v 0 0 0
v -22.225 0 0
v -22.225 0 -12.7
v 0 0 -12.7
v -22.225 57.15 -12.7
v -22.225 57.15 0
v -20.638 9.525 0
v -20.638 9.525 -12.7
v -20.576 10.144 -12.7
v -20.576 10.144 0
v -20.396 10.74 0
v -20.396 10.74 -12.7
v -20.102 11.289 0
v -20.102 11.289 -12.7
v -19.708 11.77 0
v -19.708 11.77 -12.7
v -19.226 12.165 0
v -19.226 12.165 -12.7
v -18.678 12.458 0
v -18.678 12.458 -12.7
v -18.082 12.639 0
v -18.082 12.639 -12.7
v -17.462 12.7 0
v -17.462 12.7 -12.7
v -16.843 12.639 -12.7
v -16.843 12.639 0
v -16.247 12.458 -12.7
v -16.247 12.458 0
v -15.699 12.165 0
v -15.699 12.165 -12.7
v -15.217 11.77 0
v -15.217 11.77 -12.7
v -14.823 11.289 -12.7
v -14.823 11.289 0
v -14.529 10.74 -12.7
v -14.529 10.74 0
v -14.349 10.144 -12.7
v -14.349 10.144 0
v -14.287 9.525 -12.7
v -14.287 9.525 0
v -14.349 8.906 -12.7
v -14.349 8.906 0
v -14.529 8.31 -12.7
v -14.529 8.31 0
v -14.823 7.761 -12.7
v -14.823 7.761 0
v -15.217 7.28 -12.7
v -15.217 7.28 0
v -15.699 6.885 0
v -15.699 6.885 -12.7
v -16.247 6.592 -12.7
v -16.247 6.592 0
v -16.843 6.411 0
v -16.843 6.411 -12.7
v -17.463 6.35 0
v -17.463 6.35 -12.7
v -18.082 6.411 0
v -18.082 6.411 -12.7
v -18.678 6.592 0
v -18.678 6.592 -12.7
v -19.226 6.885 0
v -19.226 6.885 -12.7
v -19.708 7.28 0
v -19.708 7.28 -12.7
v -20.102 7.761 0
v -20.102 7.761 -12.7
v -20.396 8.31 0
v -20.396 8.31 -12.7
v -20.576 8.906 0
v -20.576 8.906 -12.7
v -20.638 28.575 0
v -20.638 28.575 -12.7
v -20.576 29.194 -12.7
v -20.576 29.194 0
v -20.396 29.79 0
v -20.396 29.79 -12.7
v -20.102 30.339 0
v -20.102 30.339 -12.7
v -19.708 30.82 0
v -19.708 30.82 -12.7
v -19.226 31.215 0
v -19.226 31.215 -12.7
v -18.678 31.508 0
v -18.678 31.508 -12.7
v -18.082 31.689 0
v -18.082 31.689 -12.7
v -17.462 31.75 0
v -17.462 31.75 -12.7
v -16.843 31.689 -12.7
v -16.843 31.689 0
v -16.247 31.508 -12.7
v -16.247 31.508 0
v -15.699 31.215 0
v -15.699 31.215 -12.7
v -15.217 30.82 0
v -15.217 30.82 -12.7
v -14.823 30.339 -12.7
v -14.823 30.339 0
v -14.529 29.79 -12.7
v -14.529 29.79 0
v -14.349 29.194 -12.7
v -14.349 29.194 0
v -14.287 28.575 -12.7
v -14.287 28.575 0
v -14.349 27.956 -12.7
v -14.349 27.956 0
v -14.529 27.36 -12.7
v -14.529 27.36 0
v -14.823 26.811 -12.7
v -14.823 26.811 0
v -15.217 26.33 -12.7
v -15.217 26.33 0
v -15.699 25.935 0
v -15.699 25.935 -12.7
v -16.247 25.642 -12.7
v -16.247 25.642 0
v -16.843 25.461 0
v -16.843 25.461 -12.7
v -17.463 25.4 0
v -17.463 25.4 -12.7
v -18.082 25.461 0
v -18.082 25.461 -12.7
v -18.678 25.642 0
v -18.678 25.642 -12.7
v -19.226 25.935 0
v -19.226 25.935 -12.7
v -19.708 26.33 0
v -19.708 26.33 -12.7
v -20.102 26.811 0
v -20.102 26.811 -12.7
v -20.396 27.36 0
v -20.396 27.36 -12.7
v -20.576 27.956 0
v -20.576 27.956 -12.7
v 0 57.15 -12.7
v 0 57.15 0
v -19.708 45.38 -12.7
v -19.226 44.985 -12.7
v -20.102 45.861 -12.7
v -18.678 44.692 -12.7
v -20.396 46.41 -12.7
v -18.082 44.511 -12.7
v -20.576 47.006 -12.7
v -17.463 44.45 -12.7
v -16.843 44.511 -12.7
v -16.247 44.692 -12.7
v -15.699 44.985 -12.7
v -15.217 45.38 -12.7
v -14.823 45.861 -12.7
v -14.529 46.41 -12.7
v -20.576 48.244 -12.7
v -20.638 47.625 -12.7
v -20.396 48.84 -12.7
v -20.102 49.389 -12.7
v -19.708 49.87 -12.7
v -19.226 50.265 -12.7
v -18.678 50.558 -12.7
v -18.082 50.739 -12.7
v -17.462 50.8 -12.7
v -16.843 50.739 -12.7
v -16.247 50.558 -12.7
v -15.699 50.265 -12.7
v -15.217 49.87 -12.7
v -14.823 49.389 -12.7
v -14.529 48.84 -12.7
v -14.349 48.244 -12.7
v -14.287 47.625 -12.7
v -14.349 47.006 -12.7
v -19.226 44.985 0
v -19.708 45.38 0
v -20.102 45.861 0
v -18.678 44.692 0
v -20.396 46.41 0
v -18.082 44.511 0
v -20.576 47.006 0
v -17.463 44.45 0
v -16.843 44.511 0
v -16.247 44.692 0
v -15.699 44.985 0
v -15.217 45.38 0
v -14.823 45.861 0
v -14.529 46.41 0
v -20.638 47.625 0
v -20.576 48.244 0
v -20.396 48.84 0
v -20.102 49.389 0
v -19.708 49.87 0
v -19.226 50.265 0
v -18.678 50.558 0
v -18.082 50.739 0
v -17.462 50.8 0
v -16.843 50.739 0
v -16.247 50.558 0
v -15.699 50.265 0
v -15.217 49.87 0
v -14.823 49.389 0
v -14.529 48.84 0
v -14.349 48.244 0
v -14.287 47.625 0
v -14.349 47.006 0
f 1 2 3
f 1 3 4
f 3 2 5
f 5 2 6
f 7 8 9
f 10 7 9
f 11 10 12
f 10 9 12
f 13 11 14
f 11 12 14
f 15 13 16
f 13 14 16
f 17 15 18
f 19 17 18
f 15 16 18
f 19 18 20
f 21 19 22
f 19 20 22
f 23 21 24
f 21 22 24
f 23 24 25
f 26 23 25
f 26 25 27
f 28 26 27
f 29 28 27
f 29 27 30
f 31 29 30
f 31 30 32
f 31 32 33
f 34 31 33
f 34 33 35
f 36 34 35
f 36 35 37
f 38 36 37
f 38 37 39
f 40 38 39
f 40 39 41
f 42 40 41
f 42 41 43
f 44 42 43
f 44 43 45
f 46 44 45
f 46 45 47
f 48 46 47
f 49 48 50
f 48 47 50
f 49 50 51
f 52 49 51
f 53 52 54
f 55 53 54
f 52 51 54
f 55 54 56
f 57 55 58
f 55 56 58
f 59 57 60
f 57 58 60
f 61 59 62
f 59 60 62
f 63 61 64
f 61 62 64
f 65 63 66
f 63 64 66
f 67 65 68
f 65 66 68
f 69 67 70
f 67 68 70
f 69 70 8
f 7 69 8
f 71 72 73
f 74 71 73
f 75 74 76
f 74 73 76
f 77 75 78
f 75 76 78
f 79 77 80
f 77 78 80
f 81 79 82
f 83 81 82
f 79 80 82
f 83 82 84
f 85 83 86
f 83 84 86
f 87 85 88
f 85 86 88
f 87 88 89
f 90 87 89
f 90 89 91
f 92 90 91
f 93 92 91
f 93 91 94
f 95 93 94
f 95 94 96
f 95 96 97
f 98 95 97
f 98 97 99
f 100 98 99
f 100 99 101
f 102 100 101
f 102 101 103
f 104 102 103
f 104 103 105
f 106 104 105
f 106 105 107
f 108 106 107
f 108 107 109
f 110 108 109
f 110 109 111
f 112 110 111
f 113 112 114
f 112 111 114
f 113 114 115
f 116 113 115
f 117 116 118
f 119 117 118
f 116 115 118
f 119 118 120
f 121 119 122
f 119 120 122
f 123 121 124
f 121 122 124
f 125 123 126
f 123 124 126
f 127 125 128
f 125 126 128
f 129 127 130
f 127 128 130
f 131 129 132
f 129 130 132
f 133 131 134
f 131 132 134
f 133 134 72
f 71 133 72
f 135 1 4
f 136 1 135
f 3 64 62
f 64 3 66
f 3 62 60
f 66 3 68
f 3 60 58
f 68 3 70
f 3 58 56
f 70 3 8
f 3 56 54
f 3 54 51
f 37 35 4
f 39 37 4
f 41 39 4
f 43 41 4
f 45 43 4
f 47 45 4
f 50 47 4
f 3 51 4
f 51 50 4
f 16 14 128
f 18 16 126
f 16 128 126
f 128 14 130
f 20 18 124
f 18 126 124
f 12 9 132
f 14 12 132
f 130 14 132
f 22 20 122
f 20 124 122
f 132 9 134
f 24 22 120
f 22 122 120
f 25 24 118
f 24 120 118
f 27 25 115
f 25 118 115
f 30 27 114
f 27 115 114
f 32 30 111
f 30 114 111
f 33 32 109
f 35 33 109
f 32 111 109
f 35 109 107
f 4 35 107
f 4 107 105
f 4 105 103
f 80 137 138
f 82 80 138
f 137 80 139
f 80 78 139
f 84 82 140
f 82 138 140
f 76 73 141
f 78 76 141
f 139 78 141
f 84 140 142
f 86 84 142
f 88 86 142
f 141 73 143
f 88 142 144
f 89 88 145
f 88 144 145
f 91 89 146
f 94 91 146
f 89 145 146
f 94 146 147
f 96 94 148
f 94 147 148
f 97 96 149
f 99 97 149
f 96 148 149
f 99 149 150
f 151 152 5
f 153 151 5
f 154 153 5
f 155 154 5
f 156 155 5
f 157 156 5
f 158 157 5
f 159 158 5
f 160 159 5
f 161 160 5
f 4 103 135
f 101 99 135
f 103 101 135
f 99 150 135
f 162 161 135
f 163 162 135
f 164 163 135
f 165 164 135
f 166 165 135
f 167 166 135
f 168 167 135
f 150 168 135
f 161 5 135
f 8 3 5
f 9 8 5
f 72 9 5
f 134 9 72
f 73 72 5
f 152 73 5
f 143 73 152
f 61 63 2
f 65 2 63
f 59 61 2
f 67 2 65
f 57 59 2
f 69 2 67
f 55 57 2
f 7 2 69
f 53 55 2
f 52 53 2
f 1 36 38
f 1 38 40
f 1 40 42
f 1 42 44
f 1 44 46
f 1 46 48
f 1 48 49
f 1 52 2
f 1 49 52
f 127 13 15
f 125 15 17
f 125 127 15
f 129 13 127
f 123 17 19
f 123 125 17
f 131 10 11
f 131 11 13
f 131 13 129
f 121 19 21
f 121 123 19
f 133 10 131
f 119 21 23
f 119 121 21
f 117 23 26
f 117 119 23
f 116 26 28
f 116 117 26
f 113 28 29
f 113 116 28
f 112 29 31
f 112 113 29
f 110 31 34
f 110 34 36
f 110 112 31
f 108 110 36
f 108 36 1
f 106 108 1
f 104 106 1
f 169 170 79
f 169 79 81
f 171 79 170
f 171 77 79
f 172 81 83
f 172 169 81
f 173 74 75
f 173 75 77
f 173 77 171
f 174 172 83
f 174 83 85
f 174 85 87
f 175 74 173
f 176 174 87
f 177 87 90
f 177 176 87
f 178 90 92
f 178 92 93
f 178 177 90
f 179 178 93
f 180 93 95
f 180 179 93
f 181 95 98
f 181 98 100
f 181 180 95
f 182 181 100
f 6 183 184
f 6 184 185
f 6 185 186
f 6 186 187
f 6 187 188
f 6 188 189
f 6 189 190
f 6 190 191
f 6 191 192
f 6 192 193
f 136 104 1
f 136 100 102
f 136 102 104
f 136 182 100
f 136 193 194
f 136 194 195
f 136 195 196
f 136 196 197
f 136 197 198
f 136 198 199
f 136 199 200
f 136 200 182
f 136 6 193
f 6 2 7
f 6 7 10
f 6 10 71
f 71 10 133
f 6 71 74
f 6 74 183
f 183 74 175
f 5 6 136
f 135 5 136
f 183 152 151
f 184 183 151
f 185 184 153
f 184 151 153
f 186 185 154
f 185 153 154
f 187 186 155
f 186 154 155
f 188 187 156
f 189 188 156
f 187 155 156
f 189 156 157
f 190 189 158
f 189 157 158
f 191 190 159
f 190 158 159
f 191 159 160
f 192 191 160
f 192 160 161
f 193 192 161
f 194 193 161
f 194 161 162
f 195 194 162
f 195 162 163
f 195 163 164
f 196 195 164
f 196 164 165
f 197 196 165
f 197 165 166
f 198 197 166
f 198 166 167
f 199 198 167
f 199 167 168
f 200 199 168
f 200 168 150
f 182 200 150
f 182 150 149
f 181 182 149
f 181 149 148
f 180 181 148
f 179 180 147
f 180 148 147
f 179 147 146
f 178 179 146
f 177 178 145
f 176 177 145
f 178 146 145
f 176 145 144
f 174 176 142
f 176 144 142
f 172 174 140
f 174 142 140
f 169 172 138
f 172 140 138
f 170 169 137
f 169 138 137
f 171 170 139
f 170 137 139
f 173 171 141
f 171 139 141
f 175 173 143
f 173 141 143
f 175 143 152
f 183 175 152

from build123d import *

# Parameters (mm, degrees)
SKETCH1_W                   = 22.225
SKETCH1_H                   = 57.15
BOSS_EXTRUDE1_DEPTH         = 12.7
F_1_4_0_25_DIAMETER_HOLE1_D = 6.35


with BuildPart() as part:
    # Sketch1 → Boss-Extrude1 (new body)
    with BuildSketch(Plane.XY):
        with Locations((-11.1125, 28.575)):
            Rectangle(SKETCH1_W, SKETCH1_H)
    extrude(amount=-BOSS_EXTRUDE1_DEPTH)

    # 1/4 (0.25) Diameter Hole1 (through all)
    with Locations(Plane.XY):
        with Locations((-17.4625, 47.625), (-17.4625, 28.575), (-17.4625, 9.525)):
            Hole(F_1_4_0_25_DIAMETER_HOLE1_D / 2)


solid = part.part
